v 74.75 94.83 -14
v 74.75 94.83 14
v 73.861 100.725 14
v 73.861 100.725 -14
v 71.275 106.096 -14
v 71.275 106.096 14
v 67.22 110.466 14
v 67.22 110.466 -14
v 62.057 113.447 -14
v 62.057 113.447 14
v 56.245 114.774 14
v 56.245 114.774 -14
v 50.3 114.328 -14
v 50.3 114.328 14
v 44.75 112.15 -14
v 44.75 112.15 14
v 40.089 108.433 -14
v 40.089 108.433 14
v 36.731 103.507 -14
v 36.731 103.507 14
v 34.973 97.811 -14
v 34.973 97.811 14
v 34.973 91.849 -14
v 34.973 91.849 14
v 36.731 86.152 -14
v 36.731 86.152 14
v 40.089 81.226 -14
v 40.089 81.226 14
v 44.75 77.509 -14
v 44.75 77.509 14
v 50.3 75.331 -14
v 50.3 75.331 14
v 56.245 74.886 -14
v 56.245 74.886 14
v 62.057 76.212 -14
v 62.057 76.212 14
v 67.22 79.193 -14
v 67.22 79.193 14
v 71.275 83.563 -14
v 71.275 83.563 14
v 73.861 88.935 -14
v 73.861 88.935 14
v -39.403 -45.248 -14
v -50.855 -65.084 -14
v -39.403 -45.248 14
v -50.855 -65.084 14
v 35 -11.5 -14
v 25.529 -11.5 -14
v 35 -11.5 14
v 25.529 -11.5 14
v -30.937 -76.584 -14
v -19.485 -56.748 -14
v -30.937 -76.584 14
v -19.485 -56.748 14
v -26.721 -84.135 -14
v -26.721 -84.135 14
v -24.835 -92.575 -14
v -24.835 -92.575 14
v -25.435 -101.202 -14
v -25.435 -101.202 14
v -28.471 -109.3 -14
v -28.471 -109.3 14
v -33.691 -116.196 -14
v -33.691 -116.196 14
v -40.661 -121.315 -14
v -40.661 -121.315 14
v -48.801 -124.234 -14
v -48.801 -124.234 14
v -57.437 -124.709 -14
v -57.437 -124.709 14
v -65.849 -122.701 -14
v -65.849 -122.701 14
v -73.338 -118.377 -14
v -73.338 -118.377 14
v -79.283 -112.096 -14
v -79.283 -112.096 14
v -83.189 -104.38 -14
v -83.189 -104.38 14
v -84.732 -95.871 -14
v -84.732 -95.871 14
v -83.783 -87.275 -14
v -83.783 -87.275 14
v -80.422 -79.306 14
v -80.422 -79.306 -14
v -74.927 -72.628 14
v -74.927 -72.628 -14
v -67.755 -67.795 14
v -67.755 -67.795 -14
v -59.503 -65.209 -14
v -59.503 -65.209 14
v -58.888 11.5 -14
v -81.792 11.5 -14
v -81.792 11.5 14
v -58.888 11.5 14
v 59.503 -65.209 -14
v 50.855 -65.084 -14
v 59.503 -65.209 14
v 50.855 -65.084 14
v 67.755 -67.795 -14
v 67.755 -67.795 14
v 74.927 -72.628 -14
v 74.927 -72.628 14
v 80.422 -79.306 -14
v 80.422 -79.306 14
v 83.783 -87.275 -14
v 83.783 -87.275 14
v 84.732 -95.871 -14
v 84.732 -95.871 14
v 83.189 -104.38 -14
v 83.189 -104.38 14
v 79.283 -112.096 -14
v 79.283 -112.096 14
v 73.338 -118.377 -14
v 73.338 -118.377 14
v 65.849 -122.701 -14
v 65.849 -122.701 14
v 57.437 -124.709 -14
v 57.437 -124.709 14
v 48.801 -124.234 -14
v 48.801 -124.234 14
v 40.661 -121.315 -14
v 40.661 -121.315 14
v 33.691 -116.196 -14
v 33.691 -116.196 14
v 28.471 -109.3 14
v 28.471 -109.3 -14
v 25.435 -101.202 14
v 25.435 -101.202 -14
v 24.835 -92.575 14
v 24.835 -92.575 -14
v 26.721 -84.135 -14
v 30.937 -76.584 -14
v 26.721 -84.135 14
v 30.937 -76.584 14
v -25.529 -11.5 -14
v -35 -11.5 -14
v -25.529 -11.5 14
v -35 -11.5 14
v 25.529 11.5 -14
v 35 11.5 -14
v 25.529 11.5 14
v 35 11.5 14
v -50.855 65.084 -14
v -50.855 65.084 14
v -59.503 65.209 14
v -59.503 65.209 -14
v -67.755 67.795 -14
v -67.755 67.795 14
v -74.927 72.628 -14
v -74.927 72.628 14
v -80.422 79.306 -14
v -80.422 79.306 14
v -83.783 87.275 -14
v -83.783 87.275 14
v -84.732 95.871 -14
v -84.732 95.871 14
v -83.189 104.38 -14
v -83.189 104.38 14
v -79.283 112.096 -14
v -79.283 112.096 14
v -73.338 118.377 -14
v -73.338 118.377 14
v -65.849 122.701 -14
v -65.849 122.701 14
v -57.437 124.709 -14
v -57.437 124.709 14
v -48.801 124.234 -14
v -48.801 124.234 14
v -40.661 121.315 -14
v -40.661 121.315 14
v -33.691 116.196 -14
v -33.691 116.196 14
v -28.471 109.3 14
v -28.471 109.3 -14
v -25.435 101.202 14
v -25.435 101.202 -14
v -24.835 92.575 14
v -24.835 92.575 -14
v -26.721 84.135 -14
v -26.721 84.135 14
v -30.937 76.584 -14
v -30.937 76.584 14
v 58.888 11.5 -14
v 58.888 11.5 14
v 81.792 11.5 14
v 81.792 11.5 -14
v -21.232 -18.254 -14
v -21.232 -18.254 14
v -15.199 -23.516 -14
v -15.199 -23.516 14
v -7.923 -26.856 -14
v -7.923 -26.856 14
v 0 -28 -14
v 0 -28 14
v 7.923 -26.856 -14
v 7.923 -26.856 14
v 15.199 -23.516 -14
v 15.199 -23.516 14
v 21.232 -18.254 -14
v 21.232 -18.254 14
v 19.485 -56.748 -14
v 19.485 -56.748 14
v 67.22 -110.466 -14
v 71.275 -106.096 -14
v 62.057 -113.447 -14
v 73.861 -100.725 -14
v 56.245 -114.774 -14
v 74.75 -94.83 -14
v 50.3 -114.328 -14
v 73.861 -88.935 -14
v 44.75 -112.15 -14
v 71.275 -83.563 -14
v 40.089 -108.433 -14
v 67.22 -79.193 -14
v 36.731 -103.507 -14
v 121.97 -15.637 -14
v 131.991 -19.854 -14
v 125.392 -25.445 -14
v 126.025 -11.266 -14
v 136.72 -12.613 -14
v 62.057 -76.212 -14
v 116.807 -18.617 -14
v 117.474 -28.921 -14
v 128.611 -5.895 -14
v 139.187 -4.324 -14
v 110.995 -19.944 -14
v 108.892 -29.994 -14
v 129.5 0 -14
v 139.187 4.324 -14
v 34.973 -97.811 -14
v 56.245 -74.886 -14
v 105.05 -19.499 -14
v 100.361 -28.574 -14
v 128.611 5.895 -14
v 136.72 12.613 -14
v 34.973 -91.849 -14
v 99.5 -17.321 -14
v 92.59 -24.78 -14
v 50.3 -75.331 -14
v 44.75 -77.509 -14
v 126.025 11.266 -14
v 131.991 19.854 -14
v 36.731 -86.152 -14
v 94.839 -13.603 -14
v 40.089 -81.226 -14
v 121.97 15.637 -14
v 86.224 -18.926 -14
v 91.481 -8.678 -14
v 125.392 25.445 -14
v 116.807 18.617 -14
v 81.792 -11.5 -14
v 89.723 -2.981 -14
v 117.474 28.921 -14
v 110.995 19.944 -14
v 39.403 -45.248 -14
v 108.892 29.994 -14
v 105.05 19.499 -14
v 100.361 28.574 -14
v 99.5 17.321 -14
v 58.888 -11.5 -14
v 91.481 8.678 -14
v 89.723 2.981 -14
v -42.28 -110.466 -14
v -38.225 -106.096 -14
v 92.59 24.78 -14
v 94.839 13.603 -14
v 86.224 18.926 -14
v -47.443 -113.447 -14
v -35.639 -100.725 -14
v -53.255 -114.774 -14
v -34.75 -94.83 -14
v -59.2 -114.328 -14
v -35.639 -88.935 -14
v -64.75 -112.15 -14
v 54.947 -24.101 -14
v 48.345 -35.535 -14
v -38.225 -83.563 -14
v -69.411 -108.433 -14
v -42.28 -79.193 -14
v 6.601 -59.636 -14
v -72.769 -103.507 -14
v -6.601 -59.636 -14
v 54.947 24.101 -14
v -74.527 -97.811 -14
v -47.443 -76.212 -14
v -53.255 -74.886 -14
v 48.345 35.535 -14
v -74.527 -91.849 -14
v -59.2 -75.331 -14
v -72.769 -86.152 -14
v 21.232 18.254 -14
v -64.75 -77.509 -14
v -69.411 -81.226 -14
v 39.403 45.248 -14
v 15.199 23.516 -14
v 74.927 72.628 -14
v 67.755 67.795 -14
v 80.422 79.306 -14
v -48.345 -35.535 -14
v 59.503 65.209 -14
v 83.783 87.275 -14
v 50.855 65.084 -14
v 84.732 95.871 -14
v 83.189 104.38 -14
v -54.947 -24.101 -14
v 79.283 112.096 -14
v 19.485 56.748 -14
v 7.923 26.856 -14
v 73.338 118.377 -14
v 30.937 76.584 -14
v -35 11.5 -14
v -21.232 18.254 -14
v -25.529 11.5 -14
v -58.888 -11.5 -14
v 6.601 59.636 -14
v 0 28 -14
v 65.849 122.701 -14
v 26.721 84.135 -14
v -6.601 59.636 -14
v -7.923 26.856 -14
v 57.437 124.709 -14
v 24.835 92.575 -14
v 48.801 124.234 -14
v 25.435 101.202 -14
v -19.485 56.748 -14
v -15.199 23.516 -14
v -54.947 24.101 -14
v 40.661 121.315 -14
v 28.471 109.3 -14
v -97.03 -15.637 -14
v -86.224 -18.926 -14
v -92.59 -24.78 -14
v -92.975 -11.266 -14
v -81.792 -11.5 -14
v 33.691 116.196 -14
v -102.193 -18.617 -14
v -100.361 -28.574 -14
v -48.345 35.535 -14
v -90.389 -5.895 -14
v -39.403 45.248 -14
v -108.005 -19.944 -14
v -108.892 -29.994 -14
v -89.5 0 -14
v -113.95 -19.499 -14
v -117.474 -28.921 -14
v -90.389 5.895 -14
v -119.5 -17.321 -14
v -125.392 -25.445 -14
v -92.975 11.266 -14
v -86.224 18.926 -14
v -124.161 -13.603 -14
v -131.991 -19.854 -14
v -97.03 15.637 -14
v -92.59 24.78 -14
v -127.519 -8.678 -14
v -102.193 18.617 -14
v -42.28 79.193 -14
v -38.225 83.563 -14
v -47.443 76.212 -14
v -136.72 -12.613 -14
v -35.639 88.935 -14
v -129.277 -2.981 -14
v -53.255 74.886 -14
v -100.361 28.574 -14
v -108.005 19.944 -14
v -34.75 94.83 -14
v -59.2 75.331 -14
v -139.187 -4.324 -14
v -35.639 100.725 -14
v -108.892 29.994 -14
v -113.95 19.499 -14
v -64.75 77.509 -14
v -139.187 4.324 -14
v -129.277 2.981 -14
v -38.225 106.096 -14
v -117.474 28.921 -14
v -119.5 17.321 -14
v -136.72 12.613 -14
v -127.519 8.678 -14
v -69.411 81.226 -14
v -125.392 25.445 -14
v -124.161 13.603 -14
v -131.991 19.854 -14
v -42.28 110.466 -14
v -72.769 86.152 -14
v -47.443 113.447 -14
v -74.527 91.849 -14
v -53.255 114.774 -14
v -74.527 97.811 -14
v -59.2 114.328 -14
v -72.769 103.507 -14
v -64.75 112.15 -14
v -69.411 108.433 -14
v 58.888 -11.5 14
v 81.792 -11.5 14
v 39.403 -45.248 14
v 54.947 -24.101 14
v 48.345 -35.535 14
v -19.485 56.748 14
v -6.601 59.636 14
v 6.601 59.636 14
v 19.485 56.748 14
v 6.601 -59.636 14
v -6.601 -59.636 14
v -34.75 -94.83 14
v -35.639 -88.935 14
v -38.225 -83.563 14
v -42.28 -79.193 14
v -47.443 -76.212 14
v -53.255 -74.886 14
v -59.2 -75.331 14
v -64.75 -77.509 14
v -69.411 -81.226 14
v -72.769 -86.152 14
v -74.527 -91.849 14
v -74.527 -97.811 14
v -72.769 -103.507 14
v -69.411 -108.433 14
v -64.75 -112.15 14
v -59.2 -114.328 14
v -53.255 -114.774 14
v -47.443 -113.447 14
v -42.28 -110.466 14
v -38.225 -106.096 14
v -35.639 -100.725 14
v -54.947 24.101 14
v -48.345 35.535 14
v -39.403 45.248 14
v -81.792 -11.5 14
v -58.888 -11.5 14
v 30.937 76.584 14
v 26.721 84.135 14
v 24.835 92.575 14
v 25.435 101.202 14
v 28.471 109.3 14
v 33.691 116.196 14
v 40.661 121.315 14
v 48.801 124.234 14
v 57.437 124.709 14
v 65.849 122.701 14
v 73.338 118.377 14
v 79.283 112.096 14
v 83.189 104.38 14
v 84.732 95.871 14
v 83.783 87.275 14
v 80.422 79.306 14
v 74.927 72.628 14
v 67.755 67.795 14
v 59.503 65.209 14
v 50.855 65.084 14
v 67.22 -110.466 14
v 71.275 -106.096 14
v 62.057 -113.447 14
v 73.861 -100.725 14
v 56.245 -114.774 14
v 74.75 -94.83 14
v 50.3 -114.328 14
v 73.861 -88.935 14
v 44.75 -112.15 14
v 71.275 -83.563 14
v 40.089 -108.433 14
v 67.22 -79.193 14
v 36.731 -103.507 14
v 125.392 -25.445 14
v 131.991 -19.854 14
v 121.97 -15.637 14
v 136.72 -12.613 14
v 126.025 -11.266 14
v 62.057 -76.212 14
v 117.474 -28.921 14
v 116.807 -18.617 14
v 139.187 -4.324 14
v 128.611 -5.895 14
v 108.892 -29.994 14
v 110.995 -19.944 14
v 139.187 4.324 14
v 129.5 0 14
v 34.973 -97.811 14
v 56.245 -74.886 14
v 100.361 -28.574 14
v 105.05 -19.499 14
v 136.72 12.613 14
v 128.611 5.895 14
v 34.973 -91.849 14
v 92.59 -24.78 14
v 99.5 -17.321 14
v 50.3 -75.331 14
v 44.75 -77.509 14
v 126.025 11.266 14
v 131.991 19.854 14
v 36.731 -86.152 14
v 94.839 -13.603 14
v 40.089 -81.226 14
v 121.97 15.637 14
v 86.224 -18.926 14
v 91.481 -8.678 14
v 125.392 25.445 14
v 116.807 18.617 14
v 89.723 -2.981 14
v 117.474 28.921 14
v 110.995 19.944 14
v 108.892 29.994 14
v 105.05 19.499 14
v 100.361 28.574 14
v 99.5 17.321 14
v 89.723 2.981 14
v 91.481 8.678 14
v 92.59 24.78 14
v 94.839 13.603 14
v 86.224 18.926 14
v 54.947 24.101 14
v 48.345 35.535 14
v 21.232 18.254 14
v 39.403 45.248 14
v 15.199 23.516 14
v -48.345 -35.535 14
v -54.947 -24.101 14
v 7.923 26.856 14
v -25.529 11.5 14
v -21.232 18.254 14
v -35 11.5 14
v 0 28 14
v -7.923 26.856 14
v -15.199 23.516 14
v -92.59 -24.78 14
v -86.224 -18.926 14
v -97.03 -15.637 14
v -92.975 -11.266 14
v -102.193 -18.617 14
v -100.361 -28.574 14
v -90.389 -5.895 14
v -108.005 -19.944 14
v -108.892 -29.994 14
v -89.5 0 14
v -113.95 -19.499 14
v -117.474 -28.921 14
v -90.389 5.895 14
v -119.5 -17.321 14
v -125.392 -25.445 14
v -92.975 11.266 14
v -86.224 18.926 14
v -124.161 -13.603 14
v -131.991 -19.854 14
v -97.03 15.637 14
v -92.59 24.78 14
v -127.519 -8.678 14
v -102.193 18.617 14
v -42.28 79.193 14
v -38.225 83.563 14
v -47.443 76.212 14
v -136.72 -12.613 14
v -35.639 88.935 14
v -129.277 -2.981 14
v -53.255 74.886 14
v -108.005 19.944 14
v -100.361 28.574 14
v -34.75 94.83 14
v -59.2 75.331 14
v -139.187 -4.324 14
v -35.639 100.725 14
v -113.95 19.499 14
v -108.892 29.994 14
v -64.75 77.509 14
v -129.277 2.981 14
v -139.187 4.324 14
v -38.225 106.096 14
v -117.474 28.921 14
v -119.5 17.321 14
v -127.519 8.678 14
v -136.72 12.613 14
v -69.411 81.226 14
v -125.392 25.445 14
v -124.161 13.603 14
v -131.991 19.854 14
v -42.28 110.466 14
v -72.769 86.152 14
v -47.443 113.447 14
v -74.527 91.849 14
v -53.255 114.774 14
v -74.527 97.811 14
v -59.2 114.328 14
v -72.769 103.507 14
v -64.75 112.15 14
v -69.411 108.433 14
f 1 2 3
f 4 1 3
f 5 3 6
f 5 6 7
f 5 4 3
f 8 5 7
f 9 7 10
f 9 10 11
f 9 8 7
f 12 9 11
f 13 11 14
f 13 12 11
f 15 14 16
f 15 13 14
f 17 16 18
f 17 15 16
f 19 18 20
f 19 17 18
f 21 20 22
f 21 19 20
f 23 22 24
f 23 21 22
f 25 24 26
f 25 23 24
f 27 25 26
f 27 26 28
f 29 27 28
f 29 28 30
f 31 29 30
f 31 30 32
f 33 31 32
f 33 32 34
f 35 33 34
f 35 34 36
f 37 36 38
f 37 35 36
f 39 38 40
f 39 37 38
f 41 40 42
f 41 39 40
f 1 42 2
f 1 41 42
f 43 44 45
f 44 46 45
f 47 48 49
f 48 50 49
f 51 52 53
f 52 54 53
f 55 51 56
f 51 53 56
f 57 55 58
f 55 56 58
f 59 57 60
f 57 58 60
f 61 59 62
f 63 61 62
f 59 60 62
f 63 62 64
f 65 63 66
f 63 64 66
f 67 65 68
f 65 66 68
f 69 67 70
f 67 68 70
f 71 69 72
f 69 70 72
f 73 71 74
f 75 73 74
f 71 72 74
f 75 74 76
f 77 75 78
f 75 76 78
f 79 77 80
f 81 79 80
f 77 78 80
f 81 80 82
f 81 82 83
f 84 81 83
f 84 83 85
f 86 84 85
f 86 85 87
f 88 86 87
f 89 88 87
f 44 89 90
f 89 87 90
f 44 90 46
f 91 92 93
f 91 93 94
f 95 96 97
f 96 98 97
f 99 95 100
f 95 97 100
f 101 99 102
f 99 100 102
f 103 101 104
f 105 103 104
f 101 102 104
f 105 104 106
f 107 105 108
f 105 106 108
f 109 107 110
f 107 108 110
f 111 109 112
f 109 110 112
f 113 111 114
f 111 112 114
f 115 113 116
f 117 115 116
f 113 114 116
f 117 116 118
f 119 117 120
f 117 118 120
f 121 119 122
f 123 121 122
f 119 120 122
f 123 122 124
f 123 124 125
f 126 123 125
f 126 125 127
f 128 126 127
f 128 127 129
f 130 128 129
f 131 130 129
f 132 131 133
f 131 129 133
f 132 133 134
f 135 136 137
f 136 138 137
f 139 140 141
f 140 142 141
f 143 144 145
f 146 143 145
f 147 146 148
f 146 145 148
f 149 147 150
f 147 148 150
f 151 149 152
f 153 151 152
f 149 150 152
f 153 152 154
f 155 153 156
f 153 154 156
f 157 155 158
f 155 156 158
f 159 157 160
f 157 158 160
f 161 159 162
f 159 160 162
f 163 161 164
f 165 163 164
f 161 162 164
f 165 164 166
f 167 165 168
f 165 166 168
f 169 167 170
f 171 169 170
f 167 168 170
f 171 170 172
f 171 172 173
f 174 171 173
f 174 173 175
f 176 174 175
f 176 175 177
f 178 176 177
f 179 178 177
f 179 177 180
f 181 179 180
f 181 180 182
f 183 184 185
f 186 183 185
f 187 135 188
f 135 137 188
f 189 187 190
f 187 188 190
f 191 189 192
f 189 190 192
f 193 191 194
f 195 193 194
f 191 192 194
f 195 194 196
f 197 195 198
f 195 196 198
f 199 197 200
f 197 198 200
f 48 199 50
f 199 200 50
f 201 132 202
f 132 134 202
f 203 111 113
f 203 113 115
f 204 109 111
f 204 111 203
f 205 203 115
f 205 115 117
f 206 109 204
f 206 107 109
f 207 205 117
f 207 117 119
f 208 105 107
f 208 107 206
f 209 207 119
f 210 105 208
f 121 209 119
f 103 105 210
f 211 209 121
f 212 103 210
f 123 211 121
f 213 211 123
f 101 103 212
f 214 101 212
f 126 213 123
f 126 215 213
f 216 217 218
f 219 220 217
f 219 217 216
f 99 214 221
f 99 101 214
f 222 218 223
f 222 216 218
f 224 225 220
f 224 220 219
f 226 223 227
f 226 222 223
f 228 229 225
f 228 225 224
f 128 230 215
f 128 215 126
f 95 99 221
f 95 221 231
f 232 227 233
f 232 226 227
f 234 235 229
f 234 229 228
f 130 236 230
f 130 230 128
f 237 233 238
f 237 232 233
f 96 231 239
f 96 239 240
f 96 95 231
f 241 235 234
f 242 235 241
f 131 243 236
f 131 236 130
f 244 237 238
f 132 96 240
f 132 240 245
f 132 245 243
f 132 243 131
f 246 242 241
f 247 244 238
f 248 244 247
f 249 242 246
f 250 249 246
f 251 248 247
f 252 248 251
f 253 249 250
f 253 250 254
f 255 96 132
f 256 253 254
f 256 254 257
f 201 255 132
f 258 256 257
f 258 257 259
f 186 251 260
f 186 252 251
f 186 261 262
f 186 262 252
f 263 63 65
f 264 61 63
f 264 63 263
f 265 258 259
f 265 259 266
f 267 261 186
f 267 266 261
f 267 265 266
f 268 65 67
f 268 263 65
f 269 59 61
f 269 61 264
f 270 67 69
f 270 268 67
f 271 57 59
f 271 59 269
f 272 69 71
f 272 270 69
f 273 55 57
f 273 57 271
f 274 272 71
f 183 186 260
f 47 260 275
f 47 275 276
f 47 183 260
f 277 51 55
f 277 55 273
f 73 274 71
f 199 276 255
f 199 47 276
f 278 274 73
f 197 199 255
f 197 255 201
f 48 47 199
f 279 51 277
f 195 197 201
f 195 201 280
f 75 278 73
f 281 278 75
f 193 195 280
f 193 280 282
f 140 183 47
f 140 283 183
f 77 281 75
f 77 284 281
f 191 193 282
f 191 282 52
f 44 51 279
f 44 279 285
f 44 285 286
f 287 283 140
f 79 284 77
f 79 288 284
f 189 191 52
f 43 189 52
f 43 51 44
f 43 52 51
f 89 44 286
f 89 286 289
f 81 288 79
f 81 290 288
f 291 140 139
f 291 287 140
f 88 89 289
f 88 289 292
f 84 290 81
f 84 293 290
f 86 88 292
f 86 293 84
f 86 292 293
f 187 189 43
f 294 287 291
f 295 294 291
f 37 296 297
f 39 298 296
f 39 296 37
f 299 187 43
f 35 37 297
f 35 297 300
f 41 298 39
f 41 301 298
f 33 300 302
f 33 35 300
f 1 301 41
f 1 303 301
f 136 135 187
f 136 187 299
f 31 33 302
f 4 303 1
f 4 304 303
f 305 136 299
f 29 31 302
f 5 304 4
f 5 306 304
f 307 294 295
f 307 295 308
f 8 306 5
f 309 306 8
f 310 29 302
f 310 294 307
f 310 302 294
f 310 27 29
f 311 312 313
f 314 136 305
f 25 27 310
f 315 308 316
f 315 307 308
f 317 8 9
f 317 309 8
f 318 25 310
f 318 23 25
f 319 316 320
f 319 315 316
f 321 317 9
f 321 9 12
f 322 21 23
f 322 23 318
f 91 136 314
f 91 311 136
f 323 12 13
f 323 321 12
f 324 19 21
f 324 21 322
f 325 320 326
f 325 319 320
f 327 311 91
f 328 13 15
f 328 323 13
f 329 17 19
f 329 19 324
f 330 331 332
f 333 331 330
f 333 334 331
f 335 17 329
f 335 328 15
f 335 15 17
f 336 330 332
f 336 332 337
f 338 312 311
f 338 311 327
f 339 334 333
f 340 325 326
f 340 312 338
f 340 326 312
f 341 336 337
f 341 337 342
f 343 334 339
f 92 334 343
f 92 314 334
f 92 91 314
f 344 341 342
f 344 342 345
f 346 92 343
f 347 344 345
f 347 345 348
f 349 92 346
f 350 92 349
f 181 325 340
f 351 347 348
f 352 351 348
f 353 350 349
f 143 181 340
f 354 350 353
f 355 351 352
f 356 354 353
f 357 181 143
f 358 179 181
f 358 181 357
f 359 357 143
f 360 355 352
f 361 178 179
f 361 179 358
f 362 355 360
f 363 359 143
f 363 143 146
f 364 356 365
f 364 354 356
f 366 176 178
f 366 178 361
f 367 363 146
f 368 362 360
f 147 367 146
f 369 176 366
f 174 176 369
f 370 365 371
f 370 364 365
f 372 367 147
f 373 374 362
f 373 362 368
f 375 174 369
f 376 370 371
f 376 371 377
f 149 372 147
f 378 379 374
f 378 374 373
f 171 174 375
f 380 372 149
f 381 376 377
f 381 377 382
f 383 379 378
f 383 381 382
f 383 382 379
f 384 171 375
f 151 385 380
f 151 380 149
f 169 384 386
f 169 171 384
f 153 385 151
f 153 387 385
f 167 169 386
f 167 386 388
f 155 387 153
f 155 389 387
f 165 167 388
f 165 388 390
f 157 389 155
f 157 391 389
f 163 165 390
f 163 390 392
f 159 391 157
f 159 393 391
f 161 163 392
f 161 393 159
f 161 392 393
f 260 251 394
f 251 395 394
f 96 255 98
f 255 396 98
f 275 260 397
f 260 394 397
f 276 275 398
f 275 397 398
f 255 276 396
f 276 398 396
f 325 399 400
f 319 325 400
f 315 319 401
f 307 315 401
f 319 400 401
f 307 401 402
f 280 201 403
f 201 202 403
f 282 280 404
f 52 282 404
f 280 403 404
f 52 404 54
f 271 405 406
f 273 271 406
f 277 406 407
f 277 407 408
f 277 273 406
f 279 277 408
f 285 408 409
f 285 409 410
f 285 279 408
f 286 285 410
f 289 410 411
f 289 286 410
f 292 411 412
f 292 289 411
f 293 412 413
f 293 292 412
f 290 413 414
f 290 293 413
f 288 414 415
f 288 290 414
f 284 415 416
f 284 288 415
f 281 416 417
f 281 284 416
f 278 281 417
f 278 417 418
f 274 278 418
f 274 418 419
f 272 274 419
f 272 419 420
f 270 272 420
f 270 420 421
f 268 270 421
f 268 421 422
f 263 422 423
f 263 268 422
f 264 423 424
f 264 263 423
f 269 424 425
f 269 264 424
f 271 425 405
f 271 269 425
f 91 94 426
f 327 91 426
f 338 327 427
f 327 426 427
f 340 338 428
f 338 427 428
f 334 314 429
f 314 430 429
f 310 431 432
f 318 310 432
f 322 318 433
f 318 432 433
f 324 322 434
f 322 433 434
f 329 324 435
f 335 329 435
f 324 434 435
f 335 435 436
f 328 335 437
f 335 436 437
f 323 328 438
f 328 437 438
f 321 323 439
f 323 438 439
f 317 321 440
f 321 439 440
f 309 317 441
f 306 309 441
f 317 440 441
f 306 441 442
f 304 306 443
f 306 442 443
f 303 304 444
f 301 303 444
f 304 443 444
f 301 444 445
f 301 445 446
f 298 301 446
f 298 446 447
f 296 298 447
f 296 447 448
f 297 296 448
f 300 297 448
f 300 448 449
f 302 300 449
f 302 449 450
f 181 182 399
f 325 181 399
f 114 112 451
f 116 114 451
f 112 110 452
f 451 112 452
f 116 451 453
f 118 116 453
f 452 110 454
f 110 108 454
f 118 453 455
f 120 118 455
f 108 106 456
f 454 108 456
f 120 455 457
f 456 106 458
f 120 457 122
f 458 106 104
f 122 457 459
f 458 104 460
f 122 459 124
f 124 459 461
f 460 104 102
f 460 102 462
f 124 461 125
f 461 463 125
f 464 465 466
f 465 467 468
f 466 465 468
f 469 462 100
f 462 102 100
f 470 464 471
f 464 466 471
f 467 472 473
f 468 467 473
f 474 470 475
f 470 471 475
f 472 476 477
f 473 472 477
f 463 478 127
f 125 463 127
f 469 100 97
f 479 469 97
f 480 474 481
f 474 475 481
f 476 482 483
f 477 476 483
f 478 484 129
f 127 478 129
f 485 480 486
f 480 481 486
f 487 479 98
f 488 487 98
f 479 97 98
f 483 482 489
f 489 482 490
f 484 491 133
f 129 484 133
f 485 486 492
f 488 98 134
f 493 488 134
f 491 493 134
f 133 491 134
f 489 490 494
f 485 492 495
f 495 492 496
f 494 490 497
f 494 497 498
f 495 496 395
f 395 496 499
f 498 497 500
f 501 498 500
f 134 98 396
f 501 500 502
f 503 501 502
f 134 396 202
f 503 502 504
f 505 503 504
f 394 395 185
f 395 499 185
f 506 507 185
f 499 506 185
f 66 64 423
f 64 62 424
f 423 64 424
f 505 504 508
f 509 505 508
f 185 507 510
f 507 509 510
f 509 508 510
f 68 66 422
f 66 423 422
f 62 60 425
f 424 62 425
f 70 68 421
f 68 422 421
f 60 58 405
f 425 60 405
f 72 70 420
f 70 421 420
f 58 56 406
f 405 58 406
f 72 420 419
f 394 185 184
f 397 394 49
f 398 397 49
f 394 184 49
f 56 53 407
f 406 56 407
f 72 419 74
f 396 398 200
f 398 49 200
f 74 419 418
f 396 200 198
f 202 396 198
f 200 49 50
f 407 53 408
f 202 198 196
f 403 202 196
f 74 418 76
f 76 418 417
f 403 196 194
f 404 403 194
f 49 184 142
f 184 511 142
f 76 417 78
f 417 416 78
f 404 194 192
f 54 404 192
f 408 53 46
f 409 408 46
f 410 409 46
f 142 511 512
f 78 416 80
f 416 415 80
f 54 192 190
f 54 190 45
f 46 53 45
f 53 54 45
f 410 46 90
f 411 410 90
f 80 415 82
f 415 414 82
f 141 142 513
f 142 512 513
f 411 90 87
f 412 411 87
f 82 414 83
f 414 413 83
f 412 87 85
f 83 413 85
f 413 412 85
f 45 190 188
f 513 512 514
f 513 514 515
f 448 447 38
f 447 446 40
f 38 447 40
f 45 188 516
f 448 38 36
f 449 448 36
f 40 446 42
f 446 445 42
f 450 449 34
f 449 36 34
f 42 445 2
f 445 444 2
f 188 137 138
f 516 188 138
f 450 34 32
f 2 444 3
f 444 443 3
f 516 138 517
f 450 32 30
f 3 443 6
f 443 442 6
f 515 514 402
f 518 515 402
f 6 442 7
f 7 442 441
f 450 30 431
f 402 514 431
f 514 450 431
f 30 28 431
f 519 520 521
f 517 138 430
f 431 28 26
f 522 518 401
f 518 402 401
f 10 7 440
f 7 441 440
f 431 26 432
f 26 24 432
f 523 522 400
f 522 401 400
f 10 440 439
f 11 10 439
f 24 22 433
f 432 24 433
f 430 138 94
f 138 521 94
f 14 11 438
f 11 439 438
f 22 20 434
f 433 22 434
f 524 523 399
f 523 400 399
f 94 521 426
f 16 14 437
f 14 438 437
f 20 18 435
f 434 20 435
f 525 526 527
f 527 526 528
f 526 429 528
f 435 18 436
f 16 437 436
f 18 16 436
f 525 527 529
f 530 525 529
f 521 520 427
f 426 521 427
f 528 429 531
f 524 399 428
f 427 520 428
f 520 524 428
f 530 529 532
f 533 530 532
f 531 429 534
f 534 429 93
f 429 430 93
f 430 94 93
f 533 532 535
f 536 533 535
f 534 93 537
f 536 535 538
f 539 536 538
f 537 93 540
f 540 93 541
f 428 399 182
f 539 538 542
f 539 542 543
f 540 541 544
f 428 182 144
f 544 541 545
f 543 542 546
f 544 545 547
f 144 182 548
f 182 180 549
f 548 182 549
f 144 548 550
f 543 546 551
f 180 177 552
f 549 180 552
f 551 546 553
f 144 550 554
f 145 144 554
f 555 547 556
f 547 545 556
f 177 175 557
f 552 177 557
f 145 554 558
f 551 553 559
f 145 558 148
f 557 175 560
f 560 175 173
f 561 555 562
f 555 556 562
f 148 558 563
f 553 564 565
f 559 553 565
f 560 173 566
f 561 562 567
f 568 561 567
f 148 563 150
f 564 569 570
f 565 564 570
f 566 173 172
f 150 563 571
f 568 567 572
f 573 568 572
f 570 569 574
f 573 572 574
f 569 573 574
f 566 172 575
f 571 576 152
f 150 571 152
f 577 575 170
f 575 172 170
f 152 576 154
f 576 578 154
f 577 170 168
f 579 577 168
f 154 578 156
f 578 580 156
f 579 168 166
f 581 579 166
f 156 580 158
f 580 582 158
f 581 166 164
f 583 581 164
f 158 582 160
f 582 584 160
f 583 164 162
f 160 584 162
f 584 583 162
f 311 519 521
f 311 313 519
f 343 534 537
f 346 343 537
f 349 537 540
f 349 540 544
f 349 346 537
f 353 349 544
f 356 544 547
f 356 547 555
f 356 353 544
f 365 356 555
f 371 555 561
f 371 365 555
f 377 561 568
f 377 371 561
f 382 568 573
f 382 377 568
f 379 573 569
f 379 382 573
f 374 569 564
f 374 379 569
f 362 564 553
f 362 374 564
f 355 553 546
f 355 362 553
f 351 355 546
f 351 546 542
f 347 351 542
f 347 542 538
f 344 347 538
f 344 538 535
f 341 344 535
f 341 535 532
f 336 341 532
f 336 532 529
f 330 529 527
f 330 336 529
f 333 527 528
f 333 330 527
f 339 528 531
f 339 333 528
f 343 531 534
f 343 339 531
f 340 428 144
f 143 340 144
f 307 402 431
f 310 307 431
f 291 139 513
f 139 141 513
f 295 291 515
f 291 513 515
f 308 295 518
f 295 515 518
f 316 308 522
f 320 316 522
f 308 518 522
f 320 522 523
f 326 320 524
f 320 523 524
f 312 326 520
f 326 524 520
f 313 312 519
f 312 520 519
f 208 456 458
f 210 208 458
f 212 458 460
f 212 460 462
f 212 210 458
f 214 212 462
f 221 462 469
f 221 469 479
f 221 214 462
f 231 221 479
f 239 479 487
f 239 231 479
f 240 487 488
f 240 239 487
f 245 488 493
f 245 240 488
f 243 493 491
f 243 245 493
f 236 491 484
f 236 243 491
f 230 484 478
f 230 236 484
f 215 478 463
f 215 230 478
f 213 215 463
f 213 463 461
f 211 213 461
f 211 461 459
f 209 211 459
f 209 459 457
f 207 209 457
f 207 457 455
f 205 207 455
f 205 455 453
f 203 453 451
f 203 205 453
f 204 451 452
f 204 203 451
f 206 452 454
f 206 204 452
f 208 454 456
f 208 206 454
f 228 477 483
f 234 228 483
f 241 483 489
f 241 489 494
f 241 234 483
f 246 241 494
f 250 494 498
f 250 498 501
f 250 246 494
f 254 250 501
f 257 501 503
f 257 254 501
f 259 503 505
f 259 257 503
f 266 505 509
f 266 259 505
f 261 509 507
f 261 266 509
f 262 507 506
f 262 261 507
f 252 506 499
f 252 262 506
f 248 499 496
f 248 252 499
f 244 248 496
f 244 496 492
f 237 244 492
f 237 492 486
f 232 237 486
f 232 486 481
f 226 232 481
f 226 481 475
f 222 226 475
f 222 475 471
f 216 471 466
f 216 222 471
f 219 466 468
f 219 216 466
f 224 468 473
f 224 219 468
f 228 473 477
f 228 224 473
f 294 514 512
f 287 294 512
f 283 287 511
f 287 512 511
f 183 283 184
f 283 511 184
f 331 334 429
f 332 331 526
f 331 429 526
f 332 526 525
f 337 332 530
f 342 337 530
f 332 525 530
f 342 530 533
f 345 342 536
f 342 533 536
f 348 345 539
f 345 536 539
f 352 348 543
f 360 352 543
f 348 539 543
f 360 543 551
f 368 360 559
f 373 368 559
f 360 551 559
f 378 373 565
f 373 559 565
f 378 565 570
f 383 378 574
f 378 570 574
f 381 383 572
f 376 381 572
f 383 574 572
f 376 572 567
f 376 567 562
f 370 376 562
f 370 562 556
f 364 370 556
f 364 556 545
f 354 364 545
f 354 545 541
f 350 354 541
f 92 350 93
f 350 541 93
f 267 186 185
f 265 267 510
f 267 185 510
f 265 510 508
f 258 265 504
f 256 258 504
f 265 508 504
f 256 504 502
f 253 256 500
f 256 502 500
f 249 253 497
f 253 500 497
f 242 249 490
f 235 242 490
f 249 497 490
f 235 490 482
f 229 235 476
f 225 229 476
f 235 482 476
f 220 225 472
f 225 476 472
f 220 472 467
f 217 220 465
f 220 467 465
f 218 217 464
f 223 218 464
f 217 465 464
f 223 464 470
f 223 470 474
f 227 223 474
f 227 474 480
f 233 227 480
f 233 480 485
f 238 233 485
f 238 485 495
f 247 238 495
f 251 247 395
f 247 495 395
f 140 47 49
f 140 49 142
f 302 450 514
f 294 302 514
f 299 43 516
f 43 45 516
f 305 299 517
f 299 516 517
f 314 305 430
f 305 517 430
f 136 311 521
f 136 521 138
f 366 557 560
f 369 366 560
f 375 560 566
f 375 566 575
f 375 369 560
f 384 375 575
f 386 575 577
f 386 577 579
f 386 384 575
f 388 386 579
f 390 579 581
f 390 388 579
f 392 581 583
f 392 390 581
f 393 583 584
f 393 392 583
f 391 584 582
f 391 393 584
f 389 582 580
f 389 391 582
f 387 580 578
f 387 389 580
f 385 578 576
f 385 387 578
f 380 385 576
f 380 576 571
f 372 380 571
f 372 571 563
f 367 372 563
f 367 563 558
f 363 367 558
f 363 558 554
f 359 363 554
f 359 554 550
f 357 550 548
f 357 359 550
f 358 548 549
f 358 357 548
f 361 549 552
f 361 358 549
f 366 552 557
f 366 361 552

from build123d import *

# Parameters (mm, degrees)
SKETCH1_R           = 20
BOSS_EXTRUDE1_DEPTH = 14


with BuildPart() as part:
    # Sketch1 → Boss-Extrude1 (new, symmetric)
    with BuildSketch(Plane.XY):
        with BuildLine():
            Line((58.887604808, 11.5), (81.791697995, 11.5))
            ThreePointArc((81.791697995, 11.5), (139.5, 0), (81.791697995, -11.5))
            Line((81.791697995, -11.5), (58.887604808, -11.5))
            ThreePointArc((58.887604808, -11.5), (51.961524227, -30), (39.403094547, -45.248161732))
            Line((39.403094547, -45.248161732), (50.855141141, -65.083688282))
            ThreePointArc((50.855141141, -65.083688282), (69.75, -120.810543828), (30.936556854, -76.583688282))
            Line((30.936556854, -76.583688282), (19.48451026, -56.748161732))
            ThreePointArc((19.48451026, -56.748161732), (0, -60), (-19.48451026, -56.748161732))
            Line((-19.48451026, -56.748161732), (-30.936556854, -76.583688282))
            ThreePointArc((-30.936556854, -76.583688282), (-69.75, -120.810543828), (-50.855141141, -65.083688282))
            Line((-50.855141141, -65.083688282), (-39.403094547, -45.248161732))
            ThreePointArc((-39.403094547, -45.248161732), (-51.961524227, -30), (-58.887604808, -11.5))
            Line((-58.887604808, -11.5), (-81.791697995, -11.5))
            ThreePointArc((-81.791697995, -11.5), (-139.5, 0), (-81.791697995, 11.5))
            Line((-81.791697995, 11.5), (-58.887604808, 11.5))
            ThreePointArc((-58.887604808, 11.5), (-51.961524227, 30), (-39.403094547, 45.248161732))
            Line((-39.403094547, 45.248161732), (-50.855141141, 65.083688282))
            ThreePointArc((-50.855141141, 65.083688282), (-69.75, 120.810543828), (-30.936556854, 76.583688282))
            Line((-30.936556854, 76.583688282), (-19.48451026, 56.748161732))
            ThreePointArc((-19.48451026, 56.748161732), (0, 60), (19.48451026, 56.748161732))
            Line((19.48451026, 56.748161732), (30.936556854, 76.583688282))
            ThreePointArc((30.936556854, 76.583688282), (69.75, 120.810543828), (50.855141141, 65.083688282))
            Line((50.855141141, 65.083688282), (39.403094547, 45.248161732))
            ThreePointArc((39.403094547, 45.248161732), (51.961524227, 30), (58.887604808, 11.5))
        make_face()
        with Locations((109.5, 0)):
            Circle(SKETCH1_R, mode=Mode.SUBTRACT)
        with Locations((54.75, -94.829781714)):
            Circle(SKETCH1_R, mode=Mode.SUBTRACT)
        with Locations((-54.75, -94.829781714)):
            Circle(SKETCH1_R, mode=Mode.SUBTRACT)
        with Locations((-109.5, 0)):
            Circle(SKETCH1_R, mode=Mode.SUBTRACT)
        with Locations((-54.75, 94.829781714)):
            Circle(SKETCH1_R, mode=Mode.SUBTRACT)
        with Locations((54.75, 94.829781714)):
            Circle(SKETCH1_R, mode=Mode.SUBTRACT)
        with BuildLine():
            Line((-25.529394822, 11.5), (-35, 11.5))
            Line((-35, 11.5), (-35, -11.5))
            Line((-35, -11.5), (-25.529394822, -11.5))
            ThreePointArc((-25.529394822, -11.5), (0, -28), (25.529394822, -11.5))
            Line((25.529394822, -11.5), (35, -11.5))
            Line((35, -11.5), (35, 11.5))
            Line((35, 11.5), (25.529394822, 11.5))
            ThreePointArc((25.529394822, 11.5), (0, 28), (-25.529394822, 11.5))
        make_face(mode=Mode.SUBTRACT)
    extrude(amount=BOSS_EXTRUDE1_DEPTH, both=True)


solid = part.part
